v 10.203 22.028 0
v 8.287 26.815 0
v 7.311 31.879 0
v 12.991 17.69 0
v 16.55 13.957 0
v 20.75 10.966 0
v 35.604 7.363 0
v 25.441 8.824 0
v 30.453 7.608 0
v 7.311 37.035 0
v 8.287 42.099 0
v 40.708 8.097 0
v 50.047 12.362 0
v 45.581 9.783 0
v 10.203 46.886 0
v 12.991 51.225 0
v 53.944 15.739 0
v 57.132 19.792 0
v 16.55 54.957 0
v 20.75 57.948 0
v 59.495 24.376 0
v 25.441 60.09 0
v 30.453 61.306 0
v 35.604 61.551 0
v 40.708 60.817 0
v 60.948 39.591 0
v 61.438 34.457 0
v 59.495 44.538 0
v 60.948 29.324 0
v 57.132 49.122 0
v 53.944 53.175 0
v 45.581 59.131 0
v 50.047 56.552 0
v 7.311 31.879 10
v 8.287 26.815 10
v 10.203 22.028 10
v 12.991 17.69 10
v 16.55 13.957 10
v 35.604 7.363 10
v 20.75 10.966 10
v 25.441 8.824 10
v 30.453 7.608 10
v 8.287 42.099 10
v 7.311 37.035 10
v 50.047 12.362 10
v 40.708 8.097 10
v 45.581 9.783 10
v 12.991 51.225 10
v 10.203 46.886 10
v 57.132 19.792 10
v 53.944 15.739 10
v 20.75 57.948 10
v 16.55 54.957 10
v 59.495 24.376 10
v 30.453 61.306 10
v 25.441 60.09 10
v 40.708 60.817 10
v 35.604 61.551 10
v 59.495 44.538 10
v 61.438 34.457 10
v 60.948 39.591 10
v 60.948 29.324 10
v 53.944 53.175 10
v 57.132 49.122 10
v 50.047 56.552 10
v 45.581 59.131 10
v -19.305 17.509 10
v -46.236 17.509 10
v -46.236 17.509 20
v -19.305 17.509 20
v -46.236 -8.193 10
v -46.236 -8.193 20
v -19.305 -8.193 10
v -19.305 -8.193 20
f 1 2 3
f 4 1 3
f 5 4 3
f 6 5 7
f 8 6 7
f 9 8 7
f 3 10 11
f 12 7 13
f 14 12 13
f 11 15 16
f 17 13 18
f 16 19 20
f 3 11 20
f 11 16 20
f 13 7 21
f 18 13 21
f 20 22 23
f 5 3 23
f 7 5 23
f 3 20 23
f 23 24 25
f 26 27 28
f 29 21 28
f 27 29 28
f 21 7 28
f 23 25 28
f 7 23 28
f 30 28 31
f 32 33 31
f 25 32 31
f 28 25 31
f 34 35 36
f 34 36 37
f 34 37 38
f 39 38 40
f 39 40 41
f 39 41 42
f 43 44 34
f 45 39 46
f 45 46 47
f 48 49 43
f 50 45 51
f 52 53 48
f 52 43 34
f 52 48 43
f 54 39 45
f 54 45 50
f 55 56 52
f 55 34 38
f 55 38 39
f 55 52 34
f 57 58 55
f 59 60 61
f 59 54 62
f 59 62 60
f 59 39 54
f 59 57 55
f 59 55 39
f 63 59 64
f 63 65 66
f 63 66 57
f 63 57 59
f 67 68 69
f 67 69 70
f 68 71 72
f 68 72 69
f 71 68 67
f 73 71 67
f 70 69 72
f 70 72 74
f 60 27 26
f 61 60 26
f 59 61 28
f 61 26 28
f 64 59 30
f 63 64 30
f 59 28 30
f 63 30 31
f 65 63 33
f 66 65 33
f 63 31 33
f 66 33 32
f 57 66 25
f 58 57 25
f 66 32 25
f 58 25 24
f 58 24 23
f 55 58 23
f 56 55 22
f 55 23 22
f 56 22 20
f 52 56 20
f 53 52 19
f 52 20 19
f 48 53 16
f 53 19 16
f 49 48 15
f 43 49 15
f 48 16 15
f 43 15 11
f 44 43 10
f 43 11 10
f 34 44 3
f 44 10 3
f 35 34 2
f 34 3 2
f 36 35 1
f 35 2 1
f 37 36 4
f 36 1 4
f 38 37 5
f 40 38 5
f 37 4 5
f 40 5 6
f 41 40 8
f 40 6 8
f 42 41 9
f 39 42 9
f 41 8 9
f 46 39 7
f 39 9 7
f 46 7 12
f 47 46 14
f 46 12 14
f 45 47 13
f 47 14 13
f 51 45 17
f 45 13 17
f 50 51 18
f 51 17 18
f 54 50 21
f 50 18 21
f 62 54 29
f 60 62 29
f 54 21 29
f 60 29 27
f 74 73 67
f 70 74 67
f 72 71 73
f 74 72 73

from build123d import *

# Parameters (mm, degrees)
SKETCH1_R           = 27.12492427
BOSS_EXTRUDE1_DEPTH = 10
SKETCH2_W           = 26.93082218
SKETCH2_H           = 25.702398712
BOSS_EXTRUDE2_DEPTH = 10


with BuildPart() as part:
    # Sketch1 → Boss-Extrude1 (new body)
    with BuildSketch(Plane.XY):
        with Locations((34.312919793, 34.457095292)):
            Circle(SKETCH1_R)
    extrude(amount=BOSS_EXTRUDE1_DEPTH)


with BuildPart() as body_2:
    # Sketch2 → Boss-Extrude2 (new body)
    with BuildSketch(Plane.XY.offset(10)):
        with Locations((-32.770372386, 4.658042558)):
            Rectangle(SKETCH2_W, SKETCH2_H)
    extrude(amount=BOSS_EXTRUDE2_DEPTH)


solid = Compound([part.part, body_2.part])
